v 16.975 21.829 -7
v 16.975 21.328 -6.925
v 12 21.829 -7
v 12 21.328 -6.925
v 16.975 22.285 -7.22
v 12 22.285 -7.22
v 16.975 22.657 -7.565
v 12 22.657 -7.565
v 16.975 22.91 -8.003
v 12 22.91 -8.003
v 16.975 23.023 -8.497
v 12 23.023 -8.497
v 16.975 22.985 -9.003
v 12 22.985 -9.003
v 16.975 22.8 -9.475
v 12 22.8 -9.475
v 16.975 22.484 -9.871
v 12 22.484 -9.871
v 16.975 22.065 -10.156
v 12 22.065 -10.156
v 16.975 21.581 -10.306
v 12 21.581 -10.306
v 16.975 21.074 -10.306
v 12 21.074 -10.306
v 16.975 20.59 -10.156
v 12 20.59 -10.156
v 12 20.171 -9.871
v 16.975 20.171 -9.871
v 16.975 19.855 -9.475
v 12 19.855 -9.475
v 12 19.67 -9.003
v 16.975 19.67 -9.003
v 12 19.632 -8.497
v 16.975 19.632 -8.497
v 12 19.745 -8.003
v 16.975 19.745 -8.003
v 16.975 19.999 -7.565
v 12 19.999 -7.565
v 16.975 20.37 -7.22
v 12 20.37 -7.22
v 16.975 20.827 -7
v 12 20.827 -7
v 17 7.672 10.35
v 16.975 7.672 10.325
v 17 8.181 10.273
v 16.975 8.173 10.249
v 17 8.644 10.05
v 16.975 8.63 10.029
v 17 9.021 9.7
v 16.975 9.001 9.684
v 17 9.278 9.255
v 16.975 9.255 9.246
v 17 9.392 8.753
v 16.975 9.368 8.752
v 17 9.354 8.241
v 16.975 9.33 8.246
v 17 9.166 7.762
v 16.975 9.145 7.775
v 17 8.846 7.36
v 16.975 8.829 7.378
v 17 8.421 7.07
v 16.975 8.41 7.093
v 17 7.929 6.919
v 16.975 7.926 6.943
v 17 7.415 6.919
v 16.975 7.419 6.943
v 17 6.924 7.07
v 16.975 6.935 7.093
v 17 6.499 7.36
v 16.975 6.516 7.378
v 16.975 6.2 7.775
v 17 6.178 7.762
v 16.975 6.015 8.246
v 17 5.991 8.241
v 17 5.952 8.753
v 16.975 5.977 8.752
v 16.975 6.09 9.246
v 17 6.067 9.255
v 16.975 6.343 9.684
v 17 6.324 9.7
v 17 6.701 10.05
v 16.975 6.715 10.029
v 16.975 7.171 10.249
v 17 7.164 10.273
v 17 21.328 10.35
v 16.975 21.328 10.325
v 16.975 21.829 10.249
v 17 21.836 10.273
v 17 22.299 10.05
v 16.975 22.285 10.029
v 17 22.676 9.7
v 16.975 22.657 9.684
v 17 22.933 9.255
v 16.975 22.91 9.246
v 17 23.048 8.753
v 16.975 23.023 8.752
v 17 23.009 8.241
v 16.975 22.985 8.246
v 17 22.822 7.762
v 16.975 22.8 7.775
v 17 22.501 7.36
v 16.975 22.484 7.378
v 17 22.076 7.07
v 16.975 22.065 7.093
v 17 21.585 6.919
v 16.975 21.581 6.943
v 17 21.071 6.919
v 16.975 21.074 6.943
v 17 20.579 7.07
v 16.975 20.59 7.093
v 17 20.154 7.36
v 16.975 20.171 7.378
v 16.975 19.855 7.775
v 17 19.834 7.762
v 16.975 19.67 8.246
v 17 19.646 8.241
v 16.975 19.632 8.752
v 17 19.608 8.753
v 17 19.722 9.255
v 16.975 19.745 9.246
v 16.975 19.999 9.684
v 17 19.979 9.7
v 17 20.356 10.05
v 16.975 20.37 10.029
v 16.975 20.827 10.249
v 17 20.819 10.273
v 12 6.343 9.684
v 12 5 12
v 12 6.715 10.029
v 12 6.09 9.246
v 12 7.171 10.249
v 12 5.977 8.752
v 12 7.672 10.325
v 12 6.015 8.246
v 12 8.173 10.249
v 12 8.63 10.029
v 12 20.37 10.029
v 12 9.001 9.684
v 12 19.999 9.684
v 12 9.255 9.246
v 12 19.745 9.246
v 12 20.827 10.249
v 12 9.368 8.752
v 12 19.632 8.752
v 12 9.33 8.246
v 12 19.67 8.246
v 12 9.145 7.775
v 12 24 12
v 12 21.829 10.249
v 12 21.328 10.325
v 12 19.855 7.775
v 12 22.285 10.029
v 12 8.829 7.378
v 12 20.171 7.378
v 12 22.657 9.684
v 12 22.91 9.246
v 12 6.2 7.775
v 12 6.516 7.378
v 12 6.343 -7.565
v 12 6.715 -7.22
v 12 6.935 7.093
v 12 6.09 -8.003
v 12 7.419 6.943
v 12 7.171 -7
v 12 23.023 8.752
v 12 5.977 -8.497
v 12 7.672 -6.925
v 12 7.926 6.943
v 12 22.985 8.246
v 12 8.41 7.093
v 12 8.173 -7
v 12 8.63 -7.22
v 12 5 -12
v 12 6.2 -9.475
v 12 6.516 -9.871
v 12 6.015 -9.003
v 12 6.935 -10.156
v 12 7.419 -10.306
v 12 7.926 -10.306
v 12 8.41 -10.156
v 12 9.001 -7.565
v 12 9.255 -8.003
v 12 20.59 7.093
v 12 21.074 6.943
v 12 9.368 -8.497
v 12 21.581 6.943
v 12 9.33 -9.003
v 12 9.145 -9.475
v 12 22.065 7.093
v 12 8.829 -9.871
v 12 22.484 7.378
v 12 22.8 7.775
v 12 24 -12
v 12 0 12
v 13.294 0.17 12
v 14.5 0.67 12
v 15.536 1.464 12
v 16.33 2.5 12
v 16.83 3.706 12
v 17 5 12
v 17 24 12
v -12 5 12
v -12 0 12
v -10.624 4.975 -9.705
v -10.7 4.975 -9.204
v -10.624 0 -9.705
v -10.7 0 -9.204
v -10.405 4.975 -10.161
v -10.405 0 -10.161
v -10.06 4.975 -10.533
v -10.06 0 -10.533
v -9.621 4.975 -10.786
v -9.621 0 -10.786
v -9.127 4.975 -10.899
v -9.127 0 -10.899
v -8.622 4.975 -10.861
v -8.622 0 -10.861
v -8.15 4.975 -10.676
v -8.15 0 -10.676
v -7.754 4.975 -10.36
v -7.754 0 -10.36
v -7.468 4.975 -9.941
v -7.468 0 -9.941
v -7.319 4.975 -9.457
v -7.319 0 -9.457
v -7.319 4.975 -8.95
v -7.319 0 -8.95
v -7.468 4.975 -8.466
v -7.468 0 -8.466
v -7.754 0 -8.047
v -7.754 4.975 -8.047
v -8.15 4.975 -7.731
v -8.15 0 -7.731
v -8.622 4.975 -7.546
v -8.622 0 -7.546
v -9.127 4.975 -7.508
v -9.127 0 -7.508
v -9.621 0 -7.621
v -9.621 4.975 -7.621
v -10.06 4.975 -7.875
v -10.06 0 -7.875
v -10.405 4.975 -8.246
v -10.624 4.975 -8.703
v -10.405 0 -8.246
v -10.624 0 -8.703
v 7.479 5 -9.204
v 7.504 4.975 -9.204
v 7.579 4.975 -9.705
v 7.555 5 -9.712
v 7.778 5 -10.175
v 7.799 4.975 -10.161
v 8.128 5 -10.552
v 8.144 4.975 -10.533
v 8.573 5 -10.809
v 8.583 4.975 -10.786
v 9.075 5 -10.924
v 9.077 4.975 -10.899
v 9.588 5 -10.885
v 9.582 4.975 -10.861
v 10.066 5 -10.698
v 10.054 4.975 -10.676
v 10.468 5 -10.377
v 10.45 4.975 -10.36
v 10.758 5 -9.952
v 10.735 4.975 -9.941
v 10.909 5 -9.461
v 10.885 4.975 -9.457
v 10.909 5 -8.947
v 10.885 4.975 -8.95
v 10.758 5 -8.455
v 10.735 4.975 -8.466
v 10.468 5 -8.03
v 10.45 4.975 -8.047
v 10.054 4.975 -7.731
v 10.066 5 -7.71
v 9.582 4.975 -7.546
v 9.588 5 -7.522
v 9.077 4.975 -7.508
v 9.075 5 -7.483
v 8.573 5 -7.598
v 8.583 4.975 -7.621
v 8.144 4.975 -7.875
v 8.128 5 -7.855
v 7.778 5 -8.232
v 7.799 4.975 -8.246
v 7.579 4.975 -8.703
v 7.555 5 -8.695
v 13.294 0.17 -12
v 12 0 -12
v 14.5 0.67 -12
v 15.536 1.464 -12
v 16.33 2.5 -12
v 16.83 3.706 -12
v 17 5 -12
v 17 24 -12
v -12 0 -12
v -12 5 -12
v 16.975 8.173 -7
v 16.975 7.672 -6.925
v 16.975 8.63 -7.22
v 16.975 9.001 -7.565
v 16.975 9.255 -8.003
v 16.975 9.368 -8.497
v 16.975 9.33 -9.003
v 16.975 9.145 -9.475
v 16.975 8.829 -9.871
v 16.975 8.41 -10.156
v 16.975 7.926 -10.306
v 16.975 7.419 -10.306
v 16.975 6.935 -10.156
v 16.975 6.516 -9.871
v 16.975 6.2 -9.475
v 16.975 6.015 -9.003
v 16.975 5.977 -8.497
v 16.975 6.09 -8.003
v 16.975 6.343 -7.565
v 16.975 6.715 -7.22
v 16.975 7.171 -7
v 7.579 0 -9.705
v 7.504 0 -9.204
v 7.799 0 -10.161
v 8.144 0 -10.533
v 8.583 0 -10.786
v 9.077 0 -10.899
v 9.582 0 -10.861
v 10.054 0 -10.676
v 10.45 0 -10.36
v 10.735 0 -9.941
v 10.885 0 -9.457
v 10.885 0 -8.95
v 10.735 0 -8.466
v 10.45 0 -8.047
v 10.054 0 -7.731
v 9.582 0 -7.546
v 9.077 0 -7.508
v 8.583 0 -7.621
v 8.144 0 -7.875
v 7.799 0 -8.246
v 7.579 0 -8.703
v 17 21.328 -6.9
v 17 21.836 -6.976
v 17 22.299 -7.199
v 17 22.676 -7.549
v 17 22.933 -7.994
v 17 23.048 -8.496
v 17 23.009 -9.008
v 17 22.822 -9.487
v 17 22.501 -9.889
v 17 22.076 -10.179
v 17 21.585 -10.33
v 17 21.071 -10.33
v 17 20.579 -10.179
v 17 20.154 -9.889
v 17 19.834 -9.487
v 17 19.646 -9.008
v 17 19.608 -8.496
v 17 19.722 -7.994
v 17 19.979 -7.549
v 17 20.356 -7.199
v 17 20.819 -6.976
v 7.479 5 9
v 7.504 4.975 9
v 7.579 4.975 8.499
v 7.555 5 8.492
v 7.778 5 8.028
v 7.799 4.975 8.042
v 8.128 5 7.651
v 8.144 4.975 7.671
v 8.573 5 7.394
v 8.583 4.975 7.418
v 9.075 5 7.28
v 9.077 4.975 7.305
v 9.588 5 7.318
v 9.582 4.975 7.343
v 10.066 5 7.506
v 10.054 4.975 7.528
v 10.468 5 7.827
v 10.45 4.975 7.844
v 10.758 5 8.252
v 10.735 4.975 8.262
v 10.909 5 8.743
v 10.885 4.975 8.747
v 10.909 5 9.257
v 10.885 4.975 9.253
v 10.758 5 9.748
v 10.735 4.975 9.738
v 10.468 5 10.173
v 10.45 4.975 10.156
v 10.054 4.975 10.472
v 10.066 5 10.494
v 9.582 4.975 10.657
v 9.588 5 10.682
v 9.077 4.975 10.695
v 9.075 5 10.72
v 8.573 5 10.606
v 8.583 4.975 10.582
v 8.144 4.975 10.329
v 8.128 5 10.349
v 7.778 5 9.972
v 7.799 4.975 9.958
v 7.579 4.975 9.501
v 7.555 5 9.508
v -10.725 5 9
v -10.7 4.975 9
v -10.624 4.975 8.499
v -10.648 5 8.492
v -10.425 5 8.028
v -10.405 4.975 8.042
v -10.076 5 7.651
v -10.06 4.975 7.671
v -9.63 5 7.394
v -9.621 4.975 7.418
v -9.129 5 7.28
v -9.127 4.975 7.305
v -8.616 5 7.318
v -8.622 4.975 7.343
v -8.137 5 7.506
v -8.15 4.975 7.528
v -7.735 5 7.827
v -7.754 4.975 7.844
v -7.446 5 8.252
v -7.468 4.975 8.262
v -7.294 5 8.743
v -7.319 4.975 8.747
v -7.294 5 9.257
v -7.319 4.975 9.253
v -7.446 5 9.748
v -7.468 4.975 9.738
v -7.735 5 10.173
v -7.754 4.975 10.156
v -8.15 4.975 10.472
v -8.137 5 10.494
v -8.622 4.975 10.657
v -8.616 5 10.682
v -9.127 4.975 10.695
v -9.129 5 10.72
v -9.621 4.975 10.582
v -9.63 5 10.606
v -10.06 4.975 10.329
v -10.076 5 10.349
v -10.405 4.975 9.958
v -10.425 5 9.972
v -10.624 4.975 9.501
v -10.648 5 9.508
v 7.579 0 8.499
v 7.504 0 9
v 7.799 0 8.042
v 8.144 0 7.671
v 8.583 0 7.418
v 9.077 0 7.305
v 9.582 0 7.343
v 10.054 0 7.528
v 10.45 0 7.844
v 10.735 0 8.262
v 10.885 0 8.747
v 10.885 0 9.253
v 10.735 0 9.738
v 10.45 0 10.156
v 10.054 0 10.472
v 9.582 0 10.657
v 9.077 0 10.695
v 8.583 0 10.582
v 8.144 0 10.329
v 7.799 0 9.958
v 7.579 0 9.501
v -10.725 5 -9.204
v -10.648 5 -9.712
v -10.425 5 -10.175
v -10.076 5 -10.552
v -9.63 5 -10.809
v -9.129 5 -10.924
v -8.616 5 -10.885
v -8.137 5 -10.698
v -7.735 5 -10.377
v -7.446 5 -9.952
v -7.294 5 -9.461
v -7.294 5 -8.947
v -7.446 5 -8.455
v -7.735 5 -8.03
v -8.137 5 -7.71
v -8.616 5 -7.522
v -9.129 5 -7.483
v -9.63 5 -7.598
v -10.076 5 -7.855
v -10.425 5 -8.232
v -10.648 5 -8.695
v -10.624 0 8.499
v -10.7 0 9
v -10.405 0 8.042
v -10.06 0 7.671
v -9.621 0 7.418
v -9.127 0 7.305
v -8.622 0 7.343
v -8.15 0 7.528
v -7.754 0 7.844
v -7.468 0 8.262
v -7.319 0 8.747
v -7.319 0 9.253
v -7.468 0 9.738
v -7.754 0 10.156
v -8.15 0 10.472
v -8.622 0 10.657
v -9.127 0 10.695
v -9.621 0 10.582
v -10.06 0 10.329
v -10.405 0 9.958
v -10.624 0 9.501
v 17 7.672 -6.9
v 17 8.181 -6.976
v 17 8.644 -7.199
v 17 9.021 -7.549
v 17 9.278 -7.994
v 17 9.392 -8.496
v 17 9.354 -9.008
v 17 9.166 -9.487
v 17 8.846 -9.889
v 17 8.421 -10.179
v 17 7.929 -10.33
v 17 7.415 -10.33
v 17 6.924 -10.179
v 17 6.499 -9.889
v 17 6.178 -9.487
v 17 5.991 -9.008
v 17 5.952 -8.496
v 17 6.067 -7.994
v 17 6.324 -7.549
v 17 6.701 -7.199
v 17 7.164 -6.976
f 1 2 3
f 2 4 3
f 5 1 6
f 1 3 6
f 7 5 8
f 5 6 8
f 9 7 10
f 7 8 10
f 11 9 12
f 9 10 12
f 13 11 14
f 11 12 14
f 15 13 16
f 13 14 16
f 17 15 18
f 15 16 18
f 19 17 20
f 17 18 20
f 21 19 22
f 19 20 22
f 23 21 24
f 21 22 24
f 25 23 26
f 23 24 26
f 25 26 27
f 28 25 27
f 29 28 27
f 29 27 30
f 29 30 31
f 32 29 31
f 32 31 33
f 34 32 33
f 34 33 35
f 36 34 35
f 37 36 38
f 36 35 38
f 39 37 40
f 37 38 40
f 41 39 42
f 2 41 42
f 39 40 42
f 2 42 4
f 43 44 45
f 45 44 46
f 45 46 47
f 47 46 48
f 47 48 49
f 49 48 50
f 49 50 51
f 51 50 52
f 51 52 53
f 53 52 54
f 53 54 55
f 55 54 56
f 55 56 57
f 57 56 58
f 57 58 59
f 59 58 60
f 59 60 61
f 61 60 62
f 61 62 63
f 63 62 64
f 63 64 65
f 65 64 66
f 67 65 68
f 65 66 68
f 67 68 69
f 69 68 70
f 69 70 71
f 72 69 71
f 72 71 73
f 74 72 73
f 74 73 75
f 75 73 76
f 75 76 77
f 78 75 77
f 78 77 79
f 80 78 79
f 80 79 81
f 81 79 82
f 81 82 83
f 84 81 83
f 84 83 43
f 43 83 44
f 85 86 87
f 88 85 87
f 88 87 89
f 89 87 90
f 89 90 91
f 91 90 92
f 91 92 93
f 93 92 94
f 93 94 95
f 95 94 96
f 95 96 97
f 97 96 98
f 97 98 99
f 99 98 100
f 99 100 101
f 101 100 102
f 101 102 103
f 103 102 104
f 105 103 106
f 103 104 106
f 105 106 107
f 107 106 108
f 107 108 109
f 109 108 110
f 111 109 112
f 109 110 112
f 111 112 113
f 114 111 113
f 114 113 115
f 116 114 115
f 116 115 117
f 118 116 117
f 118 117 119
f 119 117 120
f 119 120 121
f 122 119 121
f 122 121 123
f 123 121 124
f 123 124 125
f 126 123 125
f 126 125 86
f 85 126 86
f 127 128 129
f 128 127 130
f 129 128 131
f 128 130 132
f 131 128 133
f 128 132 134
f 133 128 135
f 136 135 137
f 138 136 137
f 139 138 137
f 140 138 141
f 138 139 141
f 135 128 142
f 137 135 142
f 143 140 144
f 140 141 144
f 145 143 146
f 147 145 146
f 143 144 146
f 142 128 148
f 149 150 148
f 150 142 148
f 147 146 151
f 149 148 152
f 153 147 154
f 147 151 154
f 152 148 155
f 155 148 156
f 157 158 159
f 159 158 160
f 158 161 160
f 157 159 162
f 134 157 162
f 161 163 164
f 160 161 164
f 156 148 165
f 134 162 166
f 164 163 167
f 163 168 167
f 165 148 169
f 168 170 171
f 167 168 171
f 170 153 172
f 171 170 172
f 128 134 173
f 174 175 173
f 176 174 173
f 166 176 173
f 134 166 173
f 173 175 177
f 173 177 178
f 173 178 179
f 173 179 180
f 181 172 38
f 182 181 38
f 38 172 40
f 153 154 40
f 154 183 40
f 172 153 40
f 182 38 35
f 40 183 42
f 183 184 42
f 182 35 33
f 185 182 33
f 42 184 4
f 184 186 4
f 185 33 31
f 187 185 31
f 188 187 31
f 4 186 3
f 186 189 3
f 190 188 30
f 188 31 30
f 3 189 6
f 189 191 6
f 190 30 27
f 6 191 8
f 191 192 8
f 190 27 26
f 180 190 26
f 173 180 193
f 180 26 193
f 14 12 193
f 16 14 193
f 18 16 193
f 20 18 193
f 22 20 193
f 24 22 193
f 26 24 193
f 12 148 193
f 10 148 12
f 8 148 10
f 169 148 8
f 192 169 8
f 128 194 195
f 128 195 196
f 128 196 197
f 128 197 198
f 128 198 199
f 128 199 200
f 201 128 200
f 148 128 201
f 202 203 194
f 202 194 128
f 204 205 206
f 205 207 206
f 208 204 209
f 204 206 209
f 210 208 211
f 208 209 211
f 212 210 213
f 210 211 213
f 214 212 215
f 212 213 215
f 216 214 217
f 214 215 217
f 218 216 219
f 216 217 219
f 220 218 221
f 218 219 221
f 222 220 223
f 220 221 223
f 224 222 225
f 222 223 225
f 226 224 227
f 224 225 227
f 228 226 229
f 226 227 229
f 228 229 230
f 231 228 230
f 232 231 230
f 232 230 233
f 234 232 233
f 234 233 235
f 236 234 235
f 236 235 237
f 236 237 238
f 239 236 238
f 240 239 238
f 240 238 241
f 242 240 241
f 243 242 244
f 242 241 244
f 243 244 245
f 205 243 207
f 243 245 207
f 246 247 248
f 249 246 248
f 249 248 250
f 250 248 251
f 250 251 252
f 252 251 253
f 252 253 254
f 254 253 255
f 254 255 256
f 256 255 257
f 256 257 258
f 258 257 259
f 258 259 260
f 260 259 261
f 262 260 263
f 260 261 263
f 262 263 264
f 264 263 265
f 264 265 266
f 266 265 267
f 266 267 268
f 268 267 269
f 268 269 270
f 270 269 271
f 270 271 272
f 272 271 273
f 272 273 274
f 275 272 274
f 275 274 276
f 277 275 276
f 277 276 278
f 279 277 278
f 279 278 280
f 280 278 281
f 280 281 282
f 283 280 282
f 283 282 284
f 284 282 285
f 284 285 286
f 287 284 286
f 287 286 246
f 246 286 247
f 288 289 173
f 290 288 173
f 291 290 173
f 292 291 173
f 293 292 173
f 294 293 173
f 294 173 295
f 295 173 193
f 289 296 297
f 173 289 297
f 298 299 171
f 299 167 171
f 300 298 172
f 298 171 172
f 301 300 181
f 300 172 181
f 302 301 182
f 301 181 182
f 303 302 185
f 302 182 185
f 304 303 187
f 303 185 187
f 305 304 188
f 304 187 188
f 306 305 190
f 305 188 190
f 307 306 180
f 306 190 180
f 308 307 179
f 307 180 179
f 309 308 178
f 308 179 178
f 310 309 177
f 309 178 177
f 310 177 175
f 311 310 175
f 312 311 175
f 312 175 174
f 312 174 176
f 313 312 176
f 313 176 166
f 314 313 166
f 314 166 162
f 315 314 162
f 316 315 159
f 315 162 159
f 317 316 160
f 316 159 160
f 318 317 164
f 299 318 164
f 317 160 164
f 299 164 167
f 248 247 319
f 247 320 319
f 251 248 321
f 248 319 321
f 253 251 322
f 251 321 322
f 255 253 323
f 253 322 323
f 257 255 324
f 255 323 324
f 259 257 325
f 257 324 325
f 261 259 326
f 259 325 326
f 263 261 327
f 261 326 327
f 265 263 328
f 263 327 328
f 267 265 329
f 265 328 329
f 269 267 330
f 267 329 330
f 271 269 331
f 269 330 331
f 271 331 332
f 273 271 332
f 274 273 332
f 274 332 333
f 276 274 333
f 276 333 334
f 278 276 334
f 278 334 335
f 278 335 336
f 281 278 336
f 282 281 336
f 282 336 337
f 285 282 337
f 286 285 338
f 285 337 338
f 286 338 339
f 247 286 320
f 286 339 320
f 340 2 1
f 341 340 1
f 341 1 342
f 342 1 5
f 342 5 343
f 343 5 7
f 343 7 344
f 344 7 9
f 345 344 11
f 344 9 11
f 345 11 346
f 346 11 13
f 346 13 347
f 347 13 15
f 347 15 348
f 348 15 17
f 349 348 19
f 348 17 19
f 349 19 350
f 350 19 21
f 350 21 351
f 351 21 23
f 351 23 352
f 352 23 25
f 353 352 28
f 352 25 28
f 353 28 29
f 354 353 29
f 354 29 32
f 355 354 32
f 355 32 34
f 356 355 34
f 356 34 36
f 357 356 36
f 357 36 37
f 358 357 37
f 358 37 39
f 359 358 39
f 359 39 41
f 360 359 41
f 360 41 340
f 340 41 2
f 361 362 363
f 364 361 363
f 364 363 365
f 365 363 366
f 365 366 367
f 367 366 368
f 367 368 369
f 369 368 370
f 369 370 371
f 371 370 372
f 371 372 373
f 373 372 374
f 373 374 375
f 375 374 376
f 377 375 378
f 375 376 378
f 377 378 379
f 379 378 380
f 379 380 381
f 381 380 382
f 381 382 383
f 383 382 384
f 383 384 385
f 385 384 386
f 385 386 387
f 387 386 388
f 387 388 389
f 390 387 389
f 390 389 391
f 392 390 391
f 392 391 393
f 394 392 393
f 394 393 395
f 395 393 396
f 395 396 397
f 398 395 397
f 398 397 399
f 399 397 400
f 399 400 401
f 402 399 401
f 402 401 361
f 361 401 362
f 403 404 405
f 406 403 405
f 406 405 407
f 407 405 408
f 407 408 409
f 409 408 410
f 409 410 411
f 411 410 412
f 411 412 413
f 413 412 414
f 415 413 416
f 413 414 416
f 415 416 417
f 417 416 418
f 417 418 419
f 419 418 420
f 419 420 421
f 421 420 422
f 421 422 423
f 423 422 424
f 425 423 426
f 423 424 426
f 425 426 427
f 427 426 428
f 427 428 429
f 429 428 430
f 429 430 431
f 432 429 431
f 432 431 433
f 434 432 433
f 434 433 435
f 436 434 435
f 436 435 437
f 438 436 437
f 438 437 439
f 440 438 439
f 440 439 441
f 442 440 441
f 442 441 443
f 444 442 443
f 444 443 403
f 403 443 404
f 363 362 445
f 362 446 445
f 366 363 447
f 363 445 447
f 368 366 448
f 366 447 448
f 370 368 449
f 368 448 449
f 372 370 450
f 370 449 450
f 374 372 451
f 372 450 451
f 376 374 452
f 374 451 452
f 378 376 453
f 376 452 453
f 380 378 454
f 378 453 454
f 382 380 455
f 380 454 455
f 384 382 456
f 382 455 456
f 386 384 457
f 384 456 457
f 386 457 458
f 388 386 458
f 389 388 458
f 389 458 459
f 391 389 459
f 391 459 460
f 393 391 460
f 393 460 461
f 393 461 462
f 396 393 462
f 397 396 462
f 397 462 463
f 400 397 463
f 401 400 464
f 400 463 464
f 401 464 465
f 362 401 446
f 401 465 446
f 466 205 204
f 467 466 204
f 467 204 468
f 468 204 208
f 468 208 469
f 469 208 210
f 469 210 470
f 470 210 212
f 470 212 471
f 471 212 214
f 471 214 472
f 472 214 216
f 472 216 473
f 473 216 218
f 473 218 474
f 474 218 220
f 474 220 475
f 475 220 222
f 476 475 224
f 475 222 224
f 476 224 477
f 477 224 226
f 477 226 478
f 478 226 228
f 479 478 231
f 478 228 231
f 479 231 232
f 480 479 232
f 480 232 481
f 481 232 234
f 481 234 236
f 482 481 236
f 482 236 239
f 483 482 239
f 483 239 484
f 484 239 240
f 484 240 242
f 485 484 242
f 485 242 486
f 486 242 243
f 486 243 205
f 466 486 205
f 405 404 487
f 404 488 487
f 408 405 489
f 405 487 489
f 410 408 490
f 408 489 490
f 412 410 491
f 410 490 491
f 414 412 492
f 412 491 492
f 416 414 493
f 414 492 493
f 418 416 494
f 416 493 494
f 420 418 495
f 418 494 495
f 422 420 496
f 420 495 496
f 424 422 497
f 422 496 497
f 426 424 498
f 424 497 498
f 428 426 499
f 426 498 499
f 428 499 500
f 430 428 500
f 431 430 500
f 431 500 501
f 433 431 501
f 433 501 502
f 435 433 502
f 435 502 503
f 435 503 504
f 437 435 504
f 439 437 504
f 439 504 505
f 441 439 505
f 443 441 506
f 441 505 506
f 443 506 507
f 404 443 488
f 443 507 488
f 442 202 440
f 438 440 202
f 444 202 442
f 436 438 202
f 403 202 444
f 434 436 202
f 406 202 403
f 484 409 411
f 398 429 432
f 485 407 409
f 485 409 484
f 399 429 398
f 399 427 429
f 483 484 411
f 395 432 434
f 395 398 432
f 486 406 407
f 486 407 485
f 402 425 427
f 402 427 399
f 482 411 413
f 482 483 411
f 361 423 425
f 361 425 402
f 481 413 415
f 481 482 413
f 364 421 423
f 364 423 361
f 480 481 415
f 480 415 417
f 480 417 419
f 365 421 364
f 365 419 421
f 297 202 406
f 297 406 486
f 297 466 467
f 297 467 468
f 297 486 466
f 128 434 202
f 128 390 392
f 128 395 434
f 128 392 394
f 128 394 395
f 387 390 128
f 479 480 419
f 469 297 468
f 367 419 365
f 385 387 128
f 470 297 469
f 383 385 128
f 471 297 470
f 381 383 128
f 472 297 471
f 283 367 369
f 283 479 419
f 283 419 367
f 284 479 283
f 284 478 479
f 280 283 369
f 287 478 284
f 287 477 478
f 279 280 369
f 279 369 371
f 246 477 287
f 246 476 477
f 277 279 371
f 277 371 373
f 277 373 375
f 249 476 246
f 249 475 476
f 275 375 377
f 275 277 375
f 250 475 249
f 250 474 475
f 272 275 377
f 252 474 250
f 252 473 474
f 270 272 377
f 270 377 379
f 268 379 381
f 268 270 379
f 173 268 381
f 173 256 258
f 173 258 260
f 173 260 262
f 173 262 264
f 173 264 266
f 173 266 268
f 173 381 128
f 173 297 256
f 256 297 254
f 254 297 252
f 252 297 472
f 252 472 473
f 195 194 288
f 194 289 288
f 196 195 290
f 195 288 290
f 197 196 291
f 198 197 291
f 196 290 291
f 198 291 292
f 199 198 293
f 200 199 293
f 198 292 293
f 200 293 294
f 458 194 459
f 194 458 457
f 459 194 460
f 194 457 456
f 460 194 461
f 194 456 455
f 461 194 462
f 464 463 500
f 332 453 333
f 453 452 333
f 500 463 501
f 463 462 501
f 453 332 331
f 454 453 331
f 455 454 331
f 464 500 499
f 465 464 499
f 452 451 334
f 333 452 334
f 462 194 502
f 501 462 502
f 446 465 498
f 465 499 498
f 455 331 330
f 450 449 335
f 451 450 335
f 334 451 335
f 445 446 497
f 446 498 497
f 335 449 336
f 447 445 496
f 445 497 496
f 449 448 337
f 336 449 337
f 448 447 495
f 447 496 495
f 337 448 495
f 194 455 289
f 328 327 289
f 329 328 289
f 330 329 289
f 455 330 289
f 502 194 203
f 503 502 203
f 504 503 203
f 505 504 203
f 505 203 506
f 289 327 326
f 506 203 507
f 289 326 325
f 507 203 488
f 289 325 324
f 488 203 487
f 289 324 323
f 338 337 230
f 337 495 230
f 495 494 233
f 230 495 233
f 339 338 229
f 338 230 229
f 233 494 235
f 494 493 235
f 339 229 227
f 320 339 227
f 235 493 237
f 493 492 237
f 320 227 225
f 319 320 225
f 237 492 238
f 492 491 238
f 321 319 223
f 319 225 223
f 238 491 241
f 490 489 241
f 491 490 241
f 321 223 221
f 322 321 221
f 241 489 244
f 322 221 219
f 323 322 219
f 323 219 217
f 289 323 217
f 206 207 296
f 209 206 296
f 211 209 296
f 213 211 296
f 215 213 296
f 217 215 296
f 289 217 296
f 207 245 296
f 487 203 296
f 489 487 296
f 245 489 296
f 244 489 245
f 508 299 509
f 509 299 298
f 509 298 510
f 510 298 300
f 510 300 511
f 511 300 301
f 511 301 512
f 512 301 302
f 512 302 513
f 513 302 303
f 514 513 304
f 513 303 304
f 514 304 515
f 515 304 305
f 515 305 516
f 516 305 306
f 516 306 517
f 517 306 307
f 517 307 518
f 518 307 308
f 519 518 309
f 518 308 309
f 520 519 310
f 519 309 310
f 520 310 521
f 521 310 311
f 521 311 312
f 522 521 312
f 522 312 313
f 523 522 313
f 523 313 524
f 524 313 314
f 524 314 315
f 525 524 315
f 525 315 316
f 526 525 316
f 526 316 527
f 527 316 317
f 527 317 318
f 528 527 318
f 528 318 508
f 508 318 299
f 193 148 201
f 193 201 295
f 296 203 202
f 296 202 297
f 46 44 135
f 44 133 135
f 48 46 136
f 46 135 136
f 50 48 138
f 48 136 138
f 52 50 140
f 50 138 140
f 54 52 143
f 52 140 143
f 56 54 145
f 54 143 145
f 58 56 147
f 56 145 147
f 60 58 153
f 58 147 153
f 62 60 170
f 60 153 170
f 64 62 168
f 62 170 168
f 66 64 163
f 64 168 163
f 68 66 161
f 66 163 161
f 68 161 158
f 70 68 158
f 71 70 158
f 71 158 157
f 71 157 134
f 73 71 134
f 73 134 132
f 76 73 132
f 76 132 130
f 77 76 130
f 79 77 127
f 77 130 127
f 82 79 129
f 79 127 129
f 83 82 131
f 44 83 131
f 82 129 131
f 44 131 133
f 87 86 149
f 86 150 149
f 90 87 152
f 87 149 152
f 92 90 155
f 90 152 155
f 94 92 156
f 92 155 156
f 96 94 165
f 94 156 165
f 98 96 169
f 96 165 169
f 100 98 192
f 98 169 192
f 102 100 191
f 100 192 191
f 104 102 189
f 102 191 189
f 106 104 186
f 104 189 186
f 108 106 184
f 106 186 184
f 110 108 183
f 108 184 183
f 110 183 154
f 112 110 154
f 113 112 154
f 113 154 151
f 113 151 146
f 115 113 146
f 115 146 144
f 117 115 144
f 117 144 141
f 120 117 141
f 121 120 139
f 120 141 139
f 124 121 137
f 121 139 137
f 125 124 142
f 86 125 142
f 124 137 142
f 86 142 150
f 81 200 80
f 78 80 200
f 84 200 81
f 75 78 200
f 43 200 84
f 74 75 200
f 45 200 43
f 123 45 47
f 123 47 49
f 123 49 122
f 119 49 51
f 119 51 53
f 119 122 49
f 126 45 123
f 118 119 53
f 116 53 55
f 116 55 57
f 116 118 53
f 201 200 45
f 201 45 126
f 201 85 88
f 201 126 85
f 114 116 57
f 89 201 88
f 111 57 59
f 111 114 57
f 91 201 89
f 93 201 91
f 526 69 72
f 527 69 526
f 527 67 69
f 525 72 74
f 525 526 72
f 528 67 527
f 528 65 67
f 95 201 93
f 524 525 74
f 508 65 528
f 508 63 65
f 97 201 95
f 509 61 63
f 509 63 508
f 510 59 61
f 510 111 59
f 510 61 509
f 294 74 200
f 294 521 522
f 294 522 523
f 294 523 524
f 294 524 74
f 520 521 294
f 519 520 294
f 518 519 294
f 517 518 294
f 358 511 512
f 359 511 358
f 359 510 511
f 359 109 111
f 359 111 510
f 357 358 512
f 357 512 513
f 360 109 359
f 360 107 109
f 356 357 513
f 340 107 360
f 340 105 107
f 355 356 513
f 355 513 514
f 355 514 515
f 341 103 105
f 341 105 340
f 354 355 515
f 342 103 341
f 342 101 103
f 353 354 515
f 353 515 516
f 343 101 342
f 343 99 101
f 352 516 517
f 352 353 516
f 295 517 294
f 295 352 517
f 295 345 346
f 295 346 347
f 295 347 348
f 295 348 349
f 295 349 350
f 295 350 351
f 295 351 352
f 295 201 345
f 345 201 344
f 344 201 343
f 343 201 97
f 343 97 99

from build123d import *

# Parameters (mm, degrees)
SKETCH1_W                      = 24
SKETCH1_H                      = 24
BOSS_EXTRUDE1_DEPTH            = 5
BOSS_EXTRUDE2_START            = 12
SKETCH2_W                      = 24
SKETCH2_H                      = 24
BOSS_EXTRUDE2_DEPTH            = 5
FILLET3_R                      = 5
M3_CLEARANCE_HOLE1_D           = 3.4
M3_CLEARANCE_HOLE1_CSINK_D     = 3.45
M3_CLEARANCE_HOLE1_CSINK_ANGLE = 90
M3_CLEARANCE_HOLE2_D           = 3.4
M3_CLEARANCE_HOLE2_CSINK_D     = 3.45
M3_CLEARANCE_HOLE2_CSINK_ANGLE = 90


with BuildPart() as part:
    # Sketch1 → Boss-Extrude1 (new body)
    with BuildSketch(Plane(origin=(0, 0, 0), x_dir=(1, 0, 0), z_dir=(0, 1, 0))):
        Rectangle(SKETCH1_W, SKETCH1_H)
    extrude(amount=BOSS_EXTRUDE1_DEPTH)

    # Sketch2 → Boss-Extrude2 (add)
    with BuildSketch(Plane(origin=(0, 0, 0), x_dir=(0, 0, -1), z_dir=(1, 0, 0)).offset(BOSS_EXTRUDE2_START)):
        with Locations((0, 12)):
            Rectangle(SKETCH2_W, SKETCH2_H)
    extrude(amount=BOSS_EXTRUDE2_DEPTH)

    # Fillet3
    fillet3_edges = [part.edges().sort_by_distance(p)[0] for p in [
        (17, 0, 0),
    ]]
    fillet(fillet3_edges, radius=FILLET3_R)

    # M3 Clearance Hole1 (through all)
    with Locations(Plane(origin=(17, 0, 0), x_dir=(0, 0, -1), z_dir=(1, 0, 0))):
        with Locations((-8.624504069, 21.327732388), (8.624504069, 21.327732388), (8.624504069, 7.672267612), (-8.624504069, 7.672267612)):
            CounterSinkHole(M3_CLEARANCE_HOLE1_D / 2, M3_CLEARANCE_HOLE1_CSINK_D / 2, counter_sink_angle=M3_CLEARANCE_HOLE1_CSINK_ANGLE)

    # M3 Clearance Hole2 (through all)
    with Locations(Plane(origin=(0, 5, 0), x_dir=(1, 0, 0), z_dir=(0, 1, 0))):
        with Locations((-9, -9), (-9, 9.203654699), (9.203654699, 9.203654699), (9.203654699, -9)):
            CounterSinkHole(M3_CLEARANCE_HOLE2_D / 2, M3_CLEARANCE_HOLE2_CSINK_D / 2, counter_sink_angle=M3_CLEARANCE_HOLE2_CSINK_ANGLE)


solid = part.part
